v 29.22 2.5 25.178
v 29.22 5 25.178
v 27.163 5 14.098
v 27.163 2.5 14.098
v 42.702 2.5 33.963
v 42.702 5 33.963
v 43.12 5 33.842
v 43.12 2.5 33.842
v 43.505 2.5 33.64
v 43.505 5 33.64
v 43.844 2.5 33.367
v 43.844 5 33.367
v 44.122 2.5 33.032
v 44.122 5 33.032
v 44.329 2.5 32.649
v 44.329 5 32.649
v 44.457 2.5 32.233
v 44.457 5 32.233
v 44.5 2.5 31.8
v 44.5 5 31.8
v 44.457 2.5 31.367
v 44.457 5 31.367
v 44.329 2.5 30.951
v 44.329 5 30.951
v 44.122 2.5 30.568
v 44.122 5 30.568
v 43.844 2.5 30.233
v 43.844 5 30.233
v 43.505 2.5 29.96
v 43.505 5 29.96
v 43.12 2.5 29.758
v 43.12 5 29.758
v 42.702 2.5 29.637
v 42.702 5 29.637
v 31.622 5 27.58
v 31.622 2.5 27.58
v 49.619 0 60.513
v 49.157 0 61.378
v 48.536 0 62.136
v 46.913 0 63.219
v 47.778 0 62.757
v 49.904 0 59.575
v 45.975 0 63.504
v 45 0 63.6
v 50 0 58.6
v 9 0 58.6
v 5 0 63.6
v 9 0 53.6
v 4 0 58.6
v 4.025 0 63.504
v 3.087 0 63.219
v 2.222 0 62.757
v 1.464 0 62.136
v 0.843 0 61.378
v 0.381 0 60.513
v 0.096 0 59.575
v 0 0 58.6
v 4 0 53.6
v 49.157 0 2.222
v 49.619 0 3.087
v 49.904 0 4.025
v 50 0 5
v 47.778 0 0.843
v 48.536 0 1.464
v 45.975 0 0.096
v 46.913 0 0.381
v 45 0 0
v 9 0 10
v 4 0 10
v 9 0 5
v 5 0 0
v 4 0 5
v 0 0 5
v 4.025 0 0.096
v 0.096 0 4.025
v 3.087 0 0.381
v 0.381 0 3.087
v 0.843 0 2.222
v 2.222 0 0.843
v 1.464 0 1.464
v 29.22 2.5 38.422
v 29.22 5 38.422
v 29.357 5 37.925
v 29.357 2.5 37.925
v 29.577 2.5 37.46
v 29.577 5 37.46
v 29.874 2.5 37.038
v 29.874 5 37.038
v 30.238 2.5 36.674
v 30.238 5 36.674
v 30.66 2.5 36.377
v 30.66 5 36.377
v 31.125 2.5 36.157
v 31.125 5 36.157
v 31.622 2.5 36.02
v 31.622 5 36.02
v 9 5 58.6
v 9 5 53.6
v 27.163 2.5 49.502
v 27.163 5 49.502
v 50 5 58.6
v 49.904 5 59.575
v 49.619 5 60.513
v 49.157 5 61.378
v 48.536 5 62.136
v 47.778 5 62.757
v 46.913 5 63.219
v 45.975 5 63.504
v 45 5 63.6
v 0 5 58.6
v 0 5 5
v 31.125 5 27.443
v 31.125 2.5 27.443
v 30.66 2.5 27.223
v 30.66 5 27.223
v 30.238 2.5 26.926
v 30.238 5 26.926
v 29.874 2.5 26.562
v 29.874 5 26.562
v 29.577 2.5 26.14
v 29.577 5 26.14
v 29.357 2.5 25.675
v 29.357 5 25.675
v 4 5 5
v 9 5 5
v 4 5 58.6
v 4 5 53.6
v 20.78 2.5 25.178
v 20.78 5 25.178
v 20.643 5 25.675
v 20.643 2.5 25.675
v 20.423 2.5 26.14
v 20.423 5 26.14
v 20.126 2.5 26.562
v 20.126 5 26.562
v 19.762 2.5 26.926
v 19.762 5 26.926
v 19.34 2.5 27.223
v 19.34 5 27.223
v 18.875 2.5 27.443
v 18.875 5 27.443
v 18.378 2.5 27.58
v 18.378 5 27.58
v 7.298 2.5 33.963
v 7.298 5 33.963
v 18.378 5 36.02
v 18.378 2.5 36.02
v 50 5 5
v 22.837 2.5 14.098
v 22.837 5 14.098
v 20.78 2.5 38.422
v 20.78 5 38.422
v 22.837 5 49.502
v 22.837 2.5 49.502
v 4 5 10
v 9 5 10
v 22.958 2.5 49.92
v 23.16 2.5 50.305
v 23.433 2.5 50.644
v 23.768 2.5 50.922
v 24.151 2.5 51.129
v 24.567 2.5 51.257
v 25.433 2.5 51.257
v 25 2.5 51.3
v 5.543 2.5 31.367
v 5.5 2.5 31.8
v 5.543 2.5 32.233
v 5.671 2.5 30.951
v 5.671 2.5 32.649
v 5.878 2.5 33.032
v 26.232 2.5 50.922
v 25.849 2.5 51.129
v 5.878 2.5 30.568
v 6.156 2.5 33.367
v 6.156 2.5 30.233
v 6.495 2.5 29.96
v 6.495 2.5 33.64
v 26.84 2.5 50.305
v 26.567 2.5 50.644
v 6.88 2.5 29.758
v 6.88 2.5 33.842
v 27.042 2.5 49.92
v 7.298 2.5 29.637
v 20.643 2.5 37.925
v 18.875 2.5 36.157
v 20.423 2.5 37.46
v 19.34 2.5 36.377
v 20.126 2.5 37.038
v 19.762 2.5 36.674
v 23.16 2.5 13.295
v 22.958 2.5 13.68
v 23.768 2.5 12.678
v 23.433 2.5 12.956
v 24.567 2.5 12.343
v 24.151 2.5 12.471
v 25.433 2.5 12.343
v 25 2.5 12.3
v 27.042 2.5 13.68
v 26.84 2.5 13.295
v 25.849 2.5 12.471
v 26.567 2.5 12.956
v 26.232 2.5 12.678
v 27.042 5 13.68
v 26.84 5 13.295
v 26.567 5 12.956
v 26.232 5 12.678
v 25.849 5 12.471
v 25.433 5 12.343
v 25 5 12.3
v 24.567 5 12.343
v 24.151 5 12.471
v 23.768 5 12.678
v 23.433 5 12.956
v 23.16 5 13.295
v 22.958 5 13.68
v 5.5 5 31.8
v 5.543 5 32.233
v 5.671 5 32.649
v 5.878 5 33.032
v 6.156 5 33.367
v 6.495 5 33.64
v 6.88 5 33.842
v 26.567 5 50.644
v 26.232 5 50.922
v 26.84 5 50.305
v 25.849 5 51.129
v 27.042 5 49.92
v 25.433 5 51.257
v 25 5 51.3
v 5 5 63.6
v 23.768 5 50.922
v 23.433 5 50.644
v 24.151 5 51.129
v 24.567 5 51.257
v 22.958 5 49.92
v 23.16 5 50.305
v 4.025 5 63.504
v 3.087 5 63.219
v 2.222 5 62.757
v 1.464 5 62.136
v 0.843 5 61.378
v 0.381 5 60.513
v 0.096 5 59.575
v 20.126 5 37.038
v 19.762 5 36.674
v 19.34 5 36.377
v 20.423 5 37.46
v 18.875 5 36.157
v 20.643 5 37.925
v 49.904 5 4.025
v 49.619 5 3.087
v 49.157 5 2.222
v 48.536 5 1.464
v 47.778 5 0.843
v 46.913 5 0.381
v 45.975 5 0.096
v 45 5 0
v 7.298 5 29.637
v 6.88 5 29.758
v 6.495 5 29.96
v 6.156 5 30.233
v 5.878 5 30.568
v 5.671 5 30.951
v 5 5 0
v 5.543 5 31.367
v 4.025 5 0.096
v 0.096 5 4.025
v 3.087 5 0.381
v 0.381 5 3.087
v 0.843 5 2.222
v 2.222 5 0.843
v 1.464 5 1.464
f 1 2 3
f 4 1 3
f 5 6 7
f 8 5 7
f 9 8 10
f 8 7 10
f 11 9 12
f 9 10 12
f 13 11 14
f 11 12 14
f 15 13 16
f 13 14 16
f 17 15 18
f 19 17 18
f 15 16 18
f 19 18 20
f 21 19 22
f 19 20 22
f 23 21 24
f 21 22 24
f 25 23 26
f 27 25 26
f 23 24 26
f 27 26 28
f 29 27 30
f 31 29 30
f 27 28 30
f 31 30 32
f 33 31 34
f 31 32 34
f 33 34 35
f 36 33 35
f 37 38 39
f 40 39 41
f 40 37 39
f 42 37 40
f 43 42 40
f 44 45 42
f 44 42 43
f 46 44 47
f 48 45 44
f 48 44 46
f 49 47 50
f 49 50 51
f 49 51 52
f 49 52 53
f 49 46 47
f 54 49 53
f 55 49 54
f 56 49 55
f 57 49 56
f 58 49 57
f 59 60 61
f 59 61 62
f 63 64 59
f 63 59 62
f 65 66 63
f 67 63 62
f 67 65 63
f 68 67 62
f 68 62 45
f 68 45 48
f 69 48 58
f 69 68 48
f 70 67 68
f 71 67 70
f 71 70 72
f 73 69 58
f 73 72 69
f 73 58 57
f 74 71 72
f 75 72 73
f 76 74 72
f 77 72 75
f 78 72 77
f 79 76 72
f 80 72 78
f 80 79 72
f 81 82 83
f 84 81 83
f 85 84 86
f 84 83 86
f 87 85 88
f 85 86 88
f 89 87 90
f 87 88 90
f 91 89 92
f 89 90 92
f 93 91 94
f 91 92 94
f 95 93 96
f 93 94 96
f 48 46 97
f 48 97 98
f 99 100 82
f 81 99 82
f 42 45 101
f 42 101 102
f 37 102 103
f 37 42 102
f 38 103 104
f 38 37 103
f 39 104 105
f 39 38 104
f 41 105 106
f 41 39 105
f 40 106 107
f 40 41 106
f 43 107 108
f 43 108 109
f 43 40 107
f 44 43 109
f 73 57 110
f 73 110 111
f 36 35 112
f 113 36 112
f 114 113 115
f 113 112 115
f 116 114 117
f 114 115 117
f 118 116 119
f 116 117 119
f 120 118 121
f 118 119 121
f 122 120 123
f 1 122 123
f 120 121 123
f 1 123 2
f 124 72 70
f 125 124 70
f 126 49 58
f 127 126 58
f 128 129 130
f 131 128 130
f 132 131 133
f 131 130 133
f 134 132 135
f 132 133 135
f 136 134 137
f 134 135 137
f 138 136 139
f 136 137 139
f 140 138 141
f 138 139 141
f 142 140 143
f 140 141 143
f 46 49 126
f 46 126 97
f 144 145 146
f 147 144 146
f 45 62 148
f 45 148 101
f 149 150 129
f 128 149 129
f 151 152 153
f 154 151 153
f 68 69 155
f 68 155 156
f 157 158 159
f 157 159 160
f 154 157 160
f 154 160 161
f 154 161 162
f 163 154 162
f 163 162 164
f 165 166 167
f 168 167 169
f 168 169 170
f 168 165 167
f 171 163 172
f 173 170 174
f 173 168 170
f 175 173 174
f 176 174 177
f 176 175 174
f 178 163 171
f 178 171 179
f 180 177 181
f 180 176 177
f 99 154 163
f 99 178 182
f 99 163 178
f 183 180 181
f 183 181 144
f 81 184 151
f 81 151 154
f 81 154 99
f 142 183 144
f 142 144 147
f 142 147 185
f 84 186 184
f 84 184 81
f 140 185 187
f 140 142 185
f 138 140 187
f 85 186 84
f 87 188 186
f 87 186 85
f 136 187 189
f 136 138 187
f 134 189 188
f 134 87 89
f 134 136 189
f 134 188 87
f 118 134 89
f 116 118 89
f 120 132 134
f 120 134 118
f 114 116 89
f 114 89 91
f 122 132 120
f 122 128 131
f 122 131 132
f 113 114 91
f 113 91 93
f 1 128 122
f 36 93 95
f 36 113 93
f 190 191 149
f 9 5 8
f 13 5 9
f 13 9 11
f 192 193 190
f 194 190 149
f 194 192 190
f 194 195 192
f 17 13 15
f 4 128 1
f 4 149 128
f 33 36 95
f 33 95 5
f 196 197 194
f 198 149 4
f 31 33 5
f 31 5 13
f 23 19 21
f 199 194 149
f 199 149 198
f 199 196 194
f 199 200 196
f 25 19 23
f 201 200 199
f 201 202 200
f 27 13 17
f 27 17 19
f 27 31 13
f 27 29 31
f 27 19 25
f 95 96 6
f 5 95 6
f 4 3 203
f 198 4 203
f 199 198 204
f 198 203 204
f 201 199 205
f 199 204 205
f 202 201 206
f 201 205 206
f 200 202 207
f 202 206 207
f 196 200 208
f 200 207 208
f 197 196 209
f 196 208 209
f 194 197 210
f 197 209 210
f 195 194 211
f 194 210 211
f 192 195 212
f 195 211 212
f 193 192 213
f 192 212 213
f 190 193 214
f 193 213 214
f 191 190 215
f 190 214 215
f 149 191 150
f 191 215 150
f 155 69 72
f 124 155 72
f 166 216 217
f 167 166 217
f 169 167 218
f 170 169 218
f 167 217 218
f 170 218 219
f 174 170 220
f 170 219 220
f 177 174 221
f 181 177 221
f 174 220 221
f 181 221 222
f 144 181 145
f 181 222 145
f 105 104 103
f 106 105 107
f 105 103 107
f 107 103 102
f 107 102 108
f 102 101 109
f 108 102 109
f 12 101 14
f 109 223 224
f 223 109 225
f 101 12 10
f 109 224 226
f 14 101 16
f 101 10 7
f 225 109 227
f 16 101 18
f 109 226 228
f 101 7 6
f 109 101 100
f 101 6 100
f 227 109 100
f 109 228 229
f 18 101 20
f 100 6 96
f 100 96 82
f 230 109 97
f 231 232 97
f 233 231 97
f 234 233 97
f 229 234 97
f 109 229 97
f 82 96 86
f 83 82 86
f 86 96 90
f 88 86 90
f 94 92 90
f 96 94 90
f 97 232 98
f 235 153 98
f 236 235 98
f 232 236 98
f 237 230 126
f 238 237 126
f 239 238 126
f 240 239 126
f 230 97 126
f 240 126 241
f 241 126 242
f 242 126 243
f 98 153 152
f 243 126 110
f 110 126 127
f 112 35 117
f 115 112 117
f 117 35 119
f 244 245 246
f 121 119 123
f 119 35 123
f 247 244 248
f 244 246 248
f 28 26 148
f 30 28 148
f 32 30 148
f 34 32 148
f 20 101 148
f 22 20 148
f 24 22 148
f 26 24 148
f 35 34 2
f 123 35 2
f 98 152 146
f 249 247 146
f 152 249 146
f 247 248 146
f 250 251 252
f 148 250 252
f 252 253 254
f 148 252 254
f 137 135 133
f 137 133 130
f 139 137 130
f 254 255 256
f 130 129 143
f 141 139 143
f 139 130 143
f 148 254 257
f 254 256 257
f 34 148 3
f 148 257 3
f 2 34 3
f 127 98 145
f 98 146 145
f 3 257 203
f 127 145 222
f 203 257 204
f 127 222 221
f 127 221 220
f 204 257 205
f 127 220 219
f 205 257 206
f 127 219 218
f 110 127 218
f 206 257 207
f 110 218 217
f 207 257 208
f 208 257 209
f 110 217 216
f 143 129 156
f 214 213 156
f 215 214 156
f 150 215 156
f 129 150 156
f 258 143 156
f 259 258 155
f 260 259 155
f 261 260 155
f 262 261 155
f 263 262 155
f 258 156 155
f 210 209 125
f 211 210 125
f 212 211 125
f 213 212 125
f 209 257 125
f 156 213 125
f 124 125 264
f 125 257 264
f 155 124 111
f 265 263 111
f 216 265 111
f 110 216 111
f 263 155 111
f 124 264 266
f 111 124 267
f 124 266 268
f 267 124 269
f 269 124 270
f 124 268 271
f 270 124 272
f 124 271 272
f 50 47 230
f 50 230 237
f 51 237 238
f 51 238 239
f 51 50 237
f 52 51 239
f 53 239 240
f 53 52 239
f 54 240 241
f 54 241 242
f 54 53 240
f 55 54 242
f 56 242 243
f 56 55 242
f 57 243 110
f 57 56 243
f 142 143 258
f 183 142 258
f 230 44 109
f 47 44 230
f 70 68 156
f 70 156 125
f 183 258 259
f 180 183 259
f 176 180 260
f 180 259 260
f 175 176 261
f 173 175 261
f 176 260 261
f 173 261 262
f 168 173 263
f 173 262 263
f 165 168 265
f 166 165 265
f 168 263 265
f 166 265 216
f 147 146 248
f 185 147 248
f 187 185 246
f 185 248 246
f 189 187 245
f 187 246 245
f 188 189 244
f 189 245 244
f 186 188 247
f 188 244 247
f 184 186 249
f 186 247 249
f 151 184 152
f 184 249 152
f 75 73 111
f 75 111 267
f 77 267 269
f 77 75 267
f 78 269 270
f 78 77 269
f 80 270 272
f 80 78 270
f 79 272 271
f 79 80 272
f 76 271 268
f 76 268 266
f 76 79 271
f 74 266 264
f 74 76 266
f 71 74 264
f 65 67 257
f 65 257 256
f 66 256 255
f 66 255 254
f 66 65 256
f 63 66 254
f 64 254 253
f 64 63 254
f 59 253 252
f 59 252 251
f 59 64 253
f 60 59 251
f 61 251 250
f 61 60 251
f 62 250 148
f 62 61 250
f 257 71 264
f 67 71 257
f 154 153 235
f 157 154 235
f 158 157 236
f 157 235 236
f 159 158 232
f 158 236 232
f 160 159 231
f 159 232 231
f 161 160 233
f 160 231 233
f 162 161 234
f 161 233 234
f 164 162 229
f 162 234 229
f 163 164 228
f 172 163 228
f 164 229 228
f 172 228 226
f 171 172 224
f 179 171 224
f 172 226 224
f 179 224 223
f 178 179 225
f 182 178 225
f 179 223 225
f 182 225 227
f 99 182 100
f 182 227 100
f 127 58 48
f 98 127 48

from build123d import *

# Parameters (mm, degrees)
SKETCH2_W           = 5
SKETCH2_H           = 5
BOSS_EXTRUDE1_DEPTH = 5
CUT_EXTRUDE1_DEPTH  = 2.5


with BuildPart() as part:
    # Sketch2 → Boss-Extrude1 (new body)
    with BuildSketch(Plane(origin=(0, 0, 0), x_dir=(1, 0, 0), z_dir=(0, 1, 0))):
        with BuildLine():
            Line((5, 0), (45, 0))
            ThreePointArc((45, 0), (48.535533906, -1.464466094), (50, -5))
            Line((50, -5), (50, -58.6))
            ThreePointArc((50, -58.6), (48.535533906, -62.135533906), (45, -63.6))
            Line((45, -63.6), (5, -63.6))
            ThreePointArc((5, -63.6), (1.464466094, -62.135533906), (0, -58.6))
            Line((0, -58.6), (0, -5))
            ThreePointArc((0, -5), (1.464466094, -1.464466094), (5, 0))
        make_face()
        with Locations((6.5, -56.1)):
            Rectangle(SKETCH2_W, SKETCH2_H, mode=Mode.SUBTRACT)
        with Locations((6.5, -7.5)):
            Rectangle(SKETCH2_W, SKETCH2_H, mode=Mode.SUBTRACT)
    extrude(amount=BOSS_EXTRUDE1_DEPTH)

    # Sketch4 → Cut-Extrude1 (cut)
    with BuildSketch(Plane(origin=(0, 5, 0), x_dir=(1, 0, 0), z_dir=(0, 1, 0))):
        with BuildLine():
            Line((18.377964167, -27.579927161), (7.298442774, -29.636968644))
            ThreePointArc((7.298442774, -29.636968644), (6.008366652, -30.393500731), (5.500039, -31.8))
            ThreePointArc((5.500039, -31.8), (6.008366652, -33.206499269), (7.298442774, -33.963031356))
            Line((7.298442774, -33.963031356), (18.377964167, -36.020072839))
            ThreePointArc((18.377964167, -36.020072839), (19.95165505, -36.84834495), (20.779927161, -38.422035833))
            Line((20.779927161, -38.422035833), (22.836968644, -49.501557226))
            ThreePointArc((22.836968644, -49.501557226), (25, -51.299961), (27.163031356, -49.501557226))
            Line((27.163031356, -49.501557226), (29.220072839, -38.422035833))
            ThreePointArc((29.220072839, -38.422035833), (30.04834495, -36.84834495), (31.622035833, -36.020072839))
            Line((31.622035833, -36.020072839), (42.701557226, -33.963031356))
            ThreePointArc((42.701557226, -33.963031356), (44.499961, -31.8), (42.701557226, -29.636968644))
            Line((42.701557226, -29.636968644), (31.622035833, -27.579927161))
            ThreePointArc((31.622035833, -27.579927161), (30.04834495, -26.75165505), (29.220072839, -25.177964167))
            Line((29.220072839, -25.177964167), (27.163031356, -14.098442774))
            ThreePointArc((27.163031356, -14.098442774), (25, -12.300039), (22.836968644, -14.098442774))
            Line((22.836968644, -14.098442774), (20.779927161, -25.177964167))
            ThreePointArc((20.779927161, -25.177964167), (19.95165505, -26.75165505), (18.377964167, -27.579927161))
        make_face()
    extrude(amount=-CUT_EXTRUDE1_DEPTH, mode=Mode.SUBTRACT)


solid = part.part
